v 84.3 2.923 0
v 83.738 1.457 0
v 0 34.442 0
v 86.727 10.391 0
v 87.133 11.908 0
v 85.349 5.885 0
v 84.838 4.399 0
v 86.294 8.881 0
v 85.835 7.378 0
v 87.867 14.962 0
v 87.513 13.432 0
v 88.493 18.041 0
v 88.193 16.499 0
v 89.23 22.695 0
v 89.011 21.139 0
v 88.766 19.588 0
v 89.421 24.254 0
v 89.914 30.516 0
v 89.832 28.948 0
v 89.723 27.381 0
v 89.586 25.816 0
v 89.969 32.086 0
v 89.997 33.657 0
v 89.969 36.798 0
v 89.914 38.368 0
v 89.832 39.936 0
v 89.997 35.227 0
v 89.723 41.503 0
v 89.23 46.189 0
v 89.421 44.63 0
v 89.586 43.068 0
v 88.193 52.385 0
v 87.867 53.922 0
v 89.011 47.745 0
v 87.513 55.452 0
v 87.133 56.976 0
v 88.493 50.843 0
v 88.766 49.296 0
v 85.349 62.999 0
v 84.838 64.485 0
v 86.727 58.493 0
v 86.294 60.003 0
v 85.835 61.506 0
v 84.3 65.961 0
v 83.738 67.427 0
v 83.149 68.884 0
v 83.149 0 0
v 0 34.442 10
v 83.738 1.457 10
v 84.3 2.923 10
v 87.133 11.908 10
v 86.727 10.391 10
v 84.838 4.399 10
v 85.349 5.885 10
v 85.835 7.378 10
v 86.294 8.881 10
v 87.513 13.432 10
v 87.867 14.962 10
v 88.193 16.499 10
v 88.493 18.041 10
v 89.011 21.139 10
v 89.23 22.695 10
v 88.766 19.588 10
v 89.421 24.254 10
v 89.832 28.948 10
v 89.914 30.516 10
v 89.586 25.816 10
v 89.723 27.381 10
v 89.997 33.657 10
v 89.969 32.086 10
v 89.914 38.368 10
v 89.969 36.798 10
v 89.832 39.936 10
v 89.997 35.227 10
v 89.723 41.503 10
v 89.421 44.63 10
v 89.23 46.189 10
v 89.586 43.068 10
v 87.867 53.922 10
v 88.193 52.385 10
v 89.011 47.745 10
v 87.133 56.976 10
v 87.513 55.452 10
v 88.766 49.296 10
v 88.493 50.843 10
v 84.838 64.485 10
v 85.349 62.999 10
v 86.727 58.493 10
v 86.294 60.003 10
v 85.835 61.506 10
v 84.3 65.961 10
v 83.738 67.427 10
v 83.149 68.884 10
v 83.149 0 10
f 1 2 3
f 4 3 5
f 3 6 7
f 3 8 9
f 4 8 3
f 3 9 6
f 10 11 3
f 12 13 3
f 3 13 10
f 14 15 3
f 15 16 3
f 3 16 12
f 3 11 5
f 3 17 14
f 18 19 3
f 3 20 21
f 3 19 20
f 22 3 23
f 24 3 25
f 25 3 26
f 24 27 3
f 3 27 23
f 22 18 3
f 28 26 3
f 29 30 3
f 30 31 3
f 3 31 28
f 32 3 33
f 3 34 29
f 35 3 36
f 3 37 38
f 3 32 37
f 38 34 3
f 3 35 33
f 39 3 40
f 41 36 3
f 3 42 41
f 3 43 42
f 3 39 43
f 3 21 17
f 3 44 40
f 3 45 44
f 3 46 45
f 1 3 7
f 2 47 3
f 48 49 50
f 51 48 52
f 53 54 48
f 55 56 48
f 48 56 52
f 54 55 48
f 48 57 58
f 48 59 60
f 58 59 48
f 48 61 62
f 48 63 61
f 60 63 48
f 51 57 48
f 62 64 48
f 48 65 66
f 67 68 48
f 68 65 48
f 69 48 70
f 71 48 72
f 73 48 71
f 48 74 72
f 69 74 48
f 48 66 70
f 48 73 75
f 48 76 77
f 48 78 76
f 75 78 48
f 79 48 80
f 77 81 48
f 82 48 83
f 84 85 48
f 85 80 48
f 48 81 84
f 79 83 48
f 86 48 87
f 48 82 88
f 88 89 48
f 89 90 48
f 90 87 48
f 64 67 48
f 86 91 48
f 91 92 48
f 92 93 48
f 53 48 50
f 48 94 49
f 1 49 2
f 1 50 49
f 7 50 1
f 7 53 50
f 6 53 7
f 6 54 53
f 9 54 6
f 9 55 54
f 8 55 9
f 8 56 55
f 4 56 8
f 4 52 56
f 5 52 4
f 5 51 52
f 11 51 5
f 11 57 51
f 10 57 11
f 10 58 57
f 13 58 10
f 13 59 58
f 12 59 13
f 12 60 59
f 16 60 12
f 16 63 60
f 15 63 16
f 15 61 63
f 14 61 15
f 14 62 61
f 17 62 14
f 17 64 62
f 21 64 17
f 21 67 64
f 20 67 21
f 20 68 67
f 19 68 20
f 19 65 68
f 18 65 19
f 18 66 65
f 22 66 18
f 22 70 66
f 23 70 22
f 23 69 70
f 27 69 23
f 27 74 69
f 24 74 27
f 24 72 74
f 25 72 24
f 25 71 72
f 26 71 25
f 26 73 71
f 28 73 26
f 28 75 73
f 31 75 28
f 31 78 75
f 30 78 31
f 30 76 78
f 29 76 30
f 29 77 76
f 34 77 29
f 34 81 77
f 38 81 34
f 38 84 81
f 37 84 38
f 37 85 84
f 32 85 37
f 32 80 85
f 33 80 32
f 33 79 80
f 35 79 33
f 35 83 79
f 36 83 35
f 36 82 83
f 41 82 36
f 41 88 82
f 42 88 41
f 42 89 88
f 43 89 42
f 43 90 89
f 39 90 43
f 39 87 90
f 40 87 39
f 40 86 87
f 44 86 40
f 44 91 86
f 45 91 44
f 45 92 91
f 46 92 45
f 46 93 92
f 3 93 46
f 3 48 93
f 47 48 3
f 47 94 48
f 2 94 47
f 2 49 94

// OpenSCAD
$fn = 32;

// ----------------------------------------------------------------------
// Arc profile plate: sector, 47 points
// ----------------------------------------------------------------------

// --- parameters (mm) ---
sector_angle = 45;        // sector angle, degrees
sector_r = 90;            // outer radius
arc_step = 1;             // sampling step of the arc, degrees
plate_t = 10;             // plate thickness, Z

bbox_x = 2 * sector_r * sin(sector_angle / 2);  // chord of the sector
bbox_y = sector_r;  // depth of the sector (apex to arc)

profile = [[83.149, 0], [83.738, 1.457], [84.3, 2.923], [84.838, 4.399], [85.349, 5.885], [85.835, 7.378], [86.294, 8.881], [86.727, 10.391], [87.133, 11.908], [87.513, 13.432], [87.867, 14.962], [88.193, 16.499], [88.493, 18.041], [88.766, 19.588], [89.011, 21.139], [89.23, 22.695], [89.421, 24.254], [89.586, 25.816], [89.723, 27.381], [89.832, 28.948], [89.914, 30.516], [89.969, 32.086], [89.997, 33.657], [89.997, 35.227], [89.969, 36.798], [89.914, 38.368], [89.832, 39.936], [89.723, 41.503], [89.586, 43.068], [89.421, 44.63], [89.23, 46.189], [89.011, 47.745], [88.766, 49.296], [88.493, 50.843], [88.193, 52.385], [87.867, 53.922], [87.513, 55.452], [87.133, 56.976], [86.727, 58.493], [86.294, 60.003], [85.835, 61.506], [85.349, 62.999], [84.838, 64.485], [84.3, 65.961], [83.738, 67.427], [83.149, 68.884], [0, 34.442]];  // primary outline, 47 points, counter clockwise

// --- the one profile operation ---
linear_extrude(height = plate_t) polygon(points = profile);
